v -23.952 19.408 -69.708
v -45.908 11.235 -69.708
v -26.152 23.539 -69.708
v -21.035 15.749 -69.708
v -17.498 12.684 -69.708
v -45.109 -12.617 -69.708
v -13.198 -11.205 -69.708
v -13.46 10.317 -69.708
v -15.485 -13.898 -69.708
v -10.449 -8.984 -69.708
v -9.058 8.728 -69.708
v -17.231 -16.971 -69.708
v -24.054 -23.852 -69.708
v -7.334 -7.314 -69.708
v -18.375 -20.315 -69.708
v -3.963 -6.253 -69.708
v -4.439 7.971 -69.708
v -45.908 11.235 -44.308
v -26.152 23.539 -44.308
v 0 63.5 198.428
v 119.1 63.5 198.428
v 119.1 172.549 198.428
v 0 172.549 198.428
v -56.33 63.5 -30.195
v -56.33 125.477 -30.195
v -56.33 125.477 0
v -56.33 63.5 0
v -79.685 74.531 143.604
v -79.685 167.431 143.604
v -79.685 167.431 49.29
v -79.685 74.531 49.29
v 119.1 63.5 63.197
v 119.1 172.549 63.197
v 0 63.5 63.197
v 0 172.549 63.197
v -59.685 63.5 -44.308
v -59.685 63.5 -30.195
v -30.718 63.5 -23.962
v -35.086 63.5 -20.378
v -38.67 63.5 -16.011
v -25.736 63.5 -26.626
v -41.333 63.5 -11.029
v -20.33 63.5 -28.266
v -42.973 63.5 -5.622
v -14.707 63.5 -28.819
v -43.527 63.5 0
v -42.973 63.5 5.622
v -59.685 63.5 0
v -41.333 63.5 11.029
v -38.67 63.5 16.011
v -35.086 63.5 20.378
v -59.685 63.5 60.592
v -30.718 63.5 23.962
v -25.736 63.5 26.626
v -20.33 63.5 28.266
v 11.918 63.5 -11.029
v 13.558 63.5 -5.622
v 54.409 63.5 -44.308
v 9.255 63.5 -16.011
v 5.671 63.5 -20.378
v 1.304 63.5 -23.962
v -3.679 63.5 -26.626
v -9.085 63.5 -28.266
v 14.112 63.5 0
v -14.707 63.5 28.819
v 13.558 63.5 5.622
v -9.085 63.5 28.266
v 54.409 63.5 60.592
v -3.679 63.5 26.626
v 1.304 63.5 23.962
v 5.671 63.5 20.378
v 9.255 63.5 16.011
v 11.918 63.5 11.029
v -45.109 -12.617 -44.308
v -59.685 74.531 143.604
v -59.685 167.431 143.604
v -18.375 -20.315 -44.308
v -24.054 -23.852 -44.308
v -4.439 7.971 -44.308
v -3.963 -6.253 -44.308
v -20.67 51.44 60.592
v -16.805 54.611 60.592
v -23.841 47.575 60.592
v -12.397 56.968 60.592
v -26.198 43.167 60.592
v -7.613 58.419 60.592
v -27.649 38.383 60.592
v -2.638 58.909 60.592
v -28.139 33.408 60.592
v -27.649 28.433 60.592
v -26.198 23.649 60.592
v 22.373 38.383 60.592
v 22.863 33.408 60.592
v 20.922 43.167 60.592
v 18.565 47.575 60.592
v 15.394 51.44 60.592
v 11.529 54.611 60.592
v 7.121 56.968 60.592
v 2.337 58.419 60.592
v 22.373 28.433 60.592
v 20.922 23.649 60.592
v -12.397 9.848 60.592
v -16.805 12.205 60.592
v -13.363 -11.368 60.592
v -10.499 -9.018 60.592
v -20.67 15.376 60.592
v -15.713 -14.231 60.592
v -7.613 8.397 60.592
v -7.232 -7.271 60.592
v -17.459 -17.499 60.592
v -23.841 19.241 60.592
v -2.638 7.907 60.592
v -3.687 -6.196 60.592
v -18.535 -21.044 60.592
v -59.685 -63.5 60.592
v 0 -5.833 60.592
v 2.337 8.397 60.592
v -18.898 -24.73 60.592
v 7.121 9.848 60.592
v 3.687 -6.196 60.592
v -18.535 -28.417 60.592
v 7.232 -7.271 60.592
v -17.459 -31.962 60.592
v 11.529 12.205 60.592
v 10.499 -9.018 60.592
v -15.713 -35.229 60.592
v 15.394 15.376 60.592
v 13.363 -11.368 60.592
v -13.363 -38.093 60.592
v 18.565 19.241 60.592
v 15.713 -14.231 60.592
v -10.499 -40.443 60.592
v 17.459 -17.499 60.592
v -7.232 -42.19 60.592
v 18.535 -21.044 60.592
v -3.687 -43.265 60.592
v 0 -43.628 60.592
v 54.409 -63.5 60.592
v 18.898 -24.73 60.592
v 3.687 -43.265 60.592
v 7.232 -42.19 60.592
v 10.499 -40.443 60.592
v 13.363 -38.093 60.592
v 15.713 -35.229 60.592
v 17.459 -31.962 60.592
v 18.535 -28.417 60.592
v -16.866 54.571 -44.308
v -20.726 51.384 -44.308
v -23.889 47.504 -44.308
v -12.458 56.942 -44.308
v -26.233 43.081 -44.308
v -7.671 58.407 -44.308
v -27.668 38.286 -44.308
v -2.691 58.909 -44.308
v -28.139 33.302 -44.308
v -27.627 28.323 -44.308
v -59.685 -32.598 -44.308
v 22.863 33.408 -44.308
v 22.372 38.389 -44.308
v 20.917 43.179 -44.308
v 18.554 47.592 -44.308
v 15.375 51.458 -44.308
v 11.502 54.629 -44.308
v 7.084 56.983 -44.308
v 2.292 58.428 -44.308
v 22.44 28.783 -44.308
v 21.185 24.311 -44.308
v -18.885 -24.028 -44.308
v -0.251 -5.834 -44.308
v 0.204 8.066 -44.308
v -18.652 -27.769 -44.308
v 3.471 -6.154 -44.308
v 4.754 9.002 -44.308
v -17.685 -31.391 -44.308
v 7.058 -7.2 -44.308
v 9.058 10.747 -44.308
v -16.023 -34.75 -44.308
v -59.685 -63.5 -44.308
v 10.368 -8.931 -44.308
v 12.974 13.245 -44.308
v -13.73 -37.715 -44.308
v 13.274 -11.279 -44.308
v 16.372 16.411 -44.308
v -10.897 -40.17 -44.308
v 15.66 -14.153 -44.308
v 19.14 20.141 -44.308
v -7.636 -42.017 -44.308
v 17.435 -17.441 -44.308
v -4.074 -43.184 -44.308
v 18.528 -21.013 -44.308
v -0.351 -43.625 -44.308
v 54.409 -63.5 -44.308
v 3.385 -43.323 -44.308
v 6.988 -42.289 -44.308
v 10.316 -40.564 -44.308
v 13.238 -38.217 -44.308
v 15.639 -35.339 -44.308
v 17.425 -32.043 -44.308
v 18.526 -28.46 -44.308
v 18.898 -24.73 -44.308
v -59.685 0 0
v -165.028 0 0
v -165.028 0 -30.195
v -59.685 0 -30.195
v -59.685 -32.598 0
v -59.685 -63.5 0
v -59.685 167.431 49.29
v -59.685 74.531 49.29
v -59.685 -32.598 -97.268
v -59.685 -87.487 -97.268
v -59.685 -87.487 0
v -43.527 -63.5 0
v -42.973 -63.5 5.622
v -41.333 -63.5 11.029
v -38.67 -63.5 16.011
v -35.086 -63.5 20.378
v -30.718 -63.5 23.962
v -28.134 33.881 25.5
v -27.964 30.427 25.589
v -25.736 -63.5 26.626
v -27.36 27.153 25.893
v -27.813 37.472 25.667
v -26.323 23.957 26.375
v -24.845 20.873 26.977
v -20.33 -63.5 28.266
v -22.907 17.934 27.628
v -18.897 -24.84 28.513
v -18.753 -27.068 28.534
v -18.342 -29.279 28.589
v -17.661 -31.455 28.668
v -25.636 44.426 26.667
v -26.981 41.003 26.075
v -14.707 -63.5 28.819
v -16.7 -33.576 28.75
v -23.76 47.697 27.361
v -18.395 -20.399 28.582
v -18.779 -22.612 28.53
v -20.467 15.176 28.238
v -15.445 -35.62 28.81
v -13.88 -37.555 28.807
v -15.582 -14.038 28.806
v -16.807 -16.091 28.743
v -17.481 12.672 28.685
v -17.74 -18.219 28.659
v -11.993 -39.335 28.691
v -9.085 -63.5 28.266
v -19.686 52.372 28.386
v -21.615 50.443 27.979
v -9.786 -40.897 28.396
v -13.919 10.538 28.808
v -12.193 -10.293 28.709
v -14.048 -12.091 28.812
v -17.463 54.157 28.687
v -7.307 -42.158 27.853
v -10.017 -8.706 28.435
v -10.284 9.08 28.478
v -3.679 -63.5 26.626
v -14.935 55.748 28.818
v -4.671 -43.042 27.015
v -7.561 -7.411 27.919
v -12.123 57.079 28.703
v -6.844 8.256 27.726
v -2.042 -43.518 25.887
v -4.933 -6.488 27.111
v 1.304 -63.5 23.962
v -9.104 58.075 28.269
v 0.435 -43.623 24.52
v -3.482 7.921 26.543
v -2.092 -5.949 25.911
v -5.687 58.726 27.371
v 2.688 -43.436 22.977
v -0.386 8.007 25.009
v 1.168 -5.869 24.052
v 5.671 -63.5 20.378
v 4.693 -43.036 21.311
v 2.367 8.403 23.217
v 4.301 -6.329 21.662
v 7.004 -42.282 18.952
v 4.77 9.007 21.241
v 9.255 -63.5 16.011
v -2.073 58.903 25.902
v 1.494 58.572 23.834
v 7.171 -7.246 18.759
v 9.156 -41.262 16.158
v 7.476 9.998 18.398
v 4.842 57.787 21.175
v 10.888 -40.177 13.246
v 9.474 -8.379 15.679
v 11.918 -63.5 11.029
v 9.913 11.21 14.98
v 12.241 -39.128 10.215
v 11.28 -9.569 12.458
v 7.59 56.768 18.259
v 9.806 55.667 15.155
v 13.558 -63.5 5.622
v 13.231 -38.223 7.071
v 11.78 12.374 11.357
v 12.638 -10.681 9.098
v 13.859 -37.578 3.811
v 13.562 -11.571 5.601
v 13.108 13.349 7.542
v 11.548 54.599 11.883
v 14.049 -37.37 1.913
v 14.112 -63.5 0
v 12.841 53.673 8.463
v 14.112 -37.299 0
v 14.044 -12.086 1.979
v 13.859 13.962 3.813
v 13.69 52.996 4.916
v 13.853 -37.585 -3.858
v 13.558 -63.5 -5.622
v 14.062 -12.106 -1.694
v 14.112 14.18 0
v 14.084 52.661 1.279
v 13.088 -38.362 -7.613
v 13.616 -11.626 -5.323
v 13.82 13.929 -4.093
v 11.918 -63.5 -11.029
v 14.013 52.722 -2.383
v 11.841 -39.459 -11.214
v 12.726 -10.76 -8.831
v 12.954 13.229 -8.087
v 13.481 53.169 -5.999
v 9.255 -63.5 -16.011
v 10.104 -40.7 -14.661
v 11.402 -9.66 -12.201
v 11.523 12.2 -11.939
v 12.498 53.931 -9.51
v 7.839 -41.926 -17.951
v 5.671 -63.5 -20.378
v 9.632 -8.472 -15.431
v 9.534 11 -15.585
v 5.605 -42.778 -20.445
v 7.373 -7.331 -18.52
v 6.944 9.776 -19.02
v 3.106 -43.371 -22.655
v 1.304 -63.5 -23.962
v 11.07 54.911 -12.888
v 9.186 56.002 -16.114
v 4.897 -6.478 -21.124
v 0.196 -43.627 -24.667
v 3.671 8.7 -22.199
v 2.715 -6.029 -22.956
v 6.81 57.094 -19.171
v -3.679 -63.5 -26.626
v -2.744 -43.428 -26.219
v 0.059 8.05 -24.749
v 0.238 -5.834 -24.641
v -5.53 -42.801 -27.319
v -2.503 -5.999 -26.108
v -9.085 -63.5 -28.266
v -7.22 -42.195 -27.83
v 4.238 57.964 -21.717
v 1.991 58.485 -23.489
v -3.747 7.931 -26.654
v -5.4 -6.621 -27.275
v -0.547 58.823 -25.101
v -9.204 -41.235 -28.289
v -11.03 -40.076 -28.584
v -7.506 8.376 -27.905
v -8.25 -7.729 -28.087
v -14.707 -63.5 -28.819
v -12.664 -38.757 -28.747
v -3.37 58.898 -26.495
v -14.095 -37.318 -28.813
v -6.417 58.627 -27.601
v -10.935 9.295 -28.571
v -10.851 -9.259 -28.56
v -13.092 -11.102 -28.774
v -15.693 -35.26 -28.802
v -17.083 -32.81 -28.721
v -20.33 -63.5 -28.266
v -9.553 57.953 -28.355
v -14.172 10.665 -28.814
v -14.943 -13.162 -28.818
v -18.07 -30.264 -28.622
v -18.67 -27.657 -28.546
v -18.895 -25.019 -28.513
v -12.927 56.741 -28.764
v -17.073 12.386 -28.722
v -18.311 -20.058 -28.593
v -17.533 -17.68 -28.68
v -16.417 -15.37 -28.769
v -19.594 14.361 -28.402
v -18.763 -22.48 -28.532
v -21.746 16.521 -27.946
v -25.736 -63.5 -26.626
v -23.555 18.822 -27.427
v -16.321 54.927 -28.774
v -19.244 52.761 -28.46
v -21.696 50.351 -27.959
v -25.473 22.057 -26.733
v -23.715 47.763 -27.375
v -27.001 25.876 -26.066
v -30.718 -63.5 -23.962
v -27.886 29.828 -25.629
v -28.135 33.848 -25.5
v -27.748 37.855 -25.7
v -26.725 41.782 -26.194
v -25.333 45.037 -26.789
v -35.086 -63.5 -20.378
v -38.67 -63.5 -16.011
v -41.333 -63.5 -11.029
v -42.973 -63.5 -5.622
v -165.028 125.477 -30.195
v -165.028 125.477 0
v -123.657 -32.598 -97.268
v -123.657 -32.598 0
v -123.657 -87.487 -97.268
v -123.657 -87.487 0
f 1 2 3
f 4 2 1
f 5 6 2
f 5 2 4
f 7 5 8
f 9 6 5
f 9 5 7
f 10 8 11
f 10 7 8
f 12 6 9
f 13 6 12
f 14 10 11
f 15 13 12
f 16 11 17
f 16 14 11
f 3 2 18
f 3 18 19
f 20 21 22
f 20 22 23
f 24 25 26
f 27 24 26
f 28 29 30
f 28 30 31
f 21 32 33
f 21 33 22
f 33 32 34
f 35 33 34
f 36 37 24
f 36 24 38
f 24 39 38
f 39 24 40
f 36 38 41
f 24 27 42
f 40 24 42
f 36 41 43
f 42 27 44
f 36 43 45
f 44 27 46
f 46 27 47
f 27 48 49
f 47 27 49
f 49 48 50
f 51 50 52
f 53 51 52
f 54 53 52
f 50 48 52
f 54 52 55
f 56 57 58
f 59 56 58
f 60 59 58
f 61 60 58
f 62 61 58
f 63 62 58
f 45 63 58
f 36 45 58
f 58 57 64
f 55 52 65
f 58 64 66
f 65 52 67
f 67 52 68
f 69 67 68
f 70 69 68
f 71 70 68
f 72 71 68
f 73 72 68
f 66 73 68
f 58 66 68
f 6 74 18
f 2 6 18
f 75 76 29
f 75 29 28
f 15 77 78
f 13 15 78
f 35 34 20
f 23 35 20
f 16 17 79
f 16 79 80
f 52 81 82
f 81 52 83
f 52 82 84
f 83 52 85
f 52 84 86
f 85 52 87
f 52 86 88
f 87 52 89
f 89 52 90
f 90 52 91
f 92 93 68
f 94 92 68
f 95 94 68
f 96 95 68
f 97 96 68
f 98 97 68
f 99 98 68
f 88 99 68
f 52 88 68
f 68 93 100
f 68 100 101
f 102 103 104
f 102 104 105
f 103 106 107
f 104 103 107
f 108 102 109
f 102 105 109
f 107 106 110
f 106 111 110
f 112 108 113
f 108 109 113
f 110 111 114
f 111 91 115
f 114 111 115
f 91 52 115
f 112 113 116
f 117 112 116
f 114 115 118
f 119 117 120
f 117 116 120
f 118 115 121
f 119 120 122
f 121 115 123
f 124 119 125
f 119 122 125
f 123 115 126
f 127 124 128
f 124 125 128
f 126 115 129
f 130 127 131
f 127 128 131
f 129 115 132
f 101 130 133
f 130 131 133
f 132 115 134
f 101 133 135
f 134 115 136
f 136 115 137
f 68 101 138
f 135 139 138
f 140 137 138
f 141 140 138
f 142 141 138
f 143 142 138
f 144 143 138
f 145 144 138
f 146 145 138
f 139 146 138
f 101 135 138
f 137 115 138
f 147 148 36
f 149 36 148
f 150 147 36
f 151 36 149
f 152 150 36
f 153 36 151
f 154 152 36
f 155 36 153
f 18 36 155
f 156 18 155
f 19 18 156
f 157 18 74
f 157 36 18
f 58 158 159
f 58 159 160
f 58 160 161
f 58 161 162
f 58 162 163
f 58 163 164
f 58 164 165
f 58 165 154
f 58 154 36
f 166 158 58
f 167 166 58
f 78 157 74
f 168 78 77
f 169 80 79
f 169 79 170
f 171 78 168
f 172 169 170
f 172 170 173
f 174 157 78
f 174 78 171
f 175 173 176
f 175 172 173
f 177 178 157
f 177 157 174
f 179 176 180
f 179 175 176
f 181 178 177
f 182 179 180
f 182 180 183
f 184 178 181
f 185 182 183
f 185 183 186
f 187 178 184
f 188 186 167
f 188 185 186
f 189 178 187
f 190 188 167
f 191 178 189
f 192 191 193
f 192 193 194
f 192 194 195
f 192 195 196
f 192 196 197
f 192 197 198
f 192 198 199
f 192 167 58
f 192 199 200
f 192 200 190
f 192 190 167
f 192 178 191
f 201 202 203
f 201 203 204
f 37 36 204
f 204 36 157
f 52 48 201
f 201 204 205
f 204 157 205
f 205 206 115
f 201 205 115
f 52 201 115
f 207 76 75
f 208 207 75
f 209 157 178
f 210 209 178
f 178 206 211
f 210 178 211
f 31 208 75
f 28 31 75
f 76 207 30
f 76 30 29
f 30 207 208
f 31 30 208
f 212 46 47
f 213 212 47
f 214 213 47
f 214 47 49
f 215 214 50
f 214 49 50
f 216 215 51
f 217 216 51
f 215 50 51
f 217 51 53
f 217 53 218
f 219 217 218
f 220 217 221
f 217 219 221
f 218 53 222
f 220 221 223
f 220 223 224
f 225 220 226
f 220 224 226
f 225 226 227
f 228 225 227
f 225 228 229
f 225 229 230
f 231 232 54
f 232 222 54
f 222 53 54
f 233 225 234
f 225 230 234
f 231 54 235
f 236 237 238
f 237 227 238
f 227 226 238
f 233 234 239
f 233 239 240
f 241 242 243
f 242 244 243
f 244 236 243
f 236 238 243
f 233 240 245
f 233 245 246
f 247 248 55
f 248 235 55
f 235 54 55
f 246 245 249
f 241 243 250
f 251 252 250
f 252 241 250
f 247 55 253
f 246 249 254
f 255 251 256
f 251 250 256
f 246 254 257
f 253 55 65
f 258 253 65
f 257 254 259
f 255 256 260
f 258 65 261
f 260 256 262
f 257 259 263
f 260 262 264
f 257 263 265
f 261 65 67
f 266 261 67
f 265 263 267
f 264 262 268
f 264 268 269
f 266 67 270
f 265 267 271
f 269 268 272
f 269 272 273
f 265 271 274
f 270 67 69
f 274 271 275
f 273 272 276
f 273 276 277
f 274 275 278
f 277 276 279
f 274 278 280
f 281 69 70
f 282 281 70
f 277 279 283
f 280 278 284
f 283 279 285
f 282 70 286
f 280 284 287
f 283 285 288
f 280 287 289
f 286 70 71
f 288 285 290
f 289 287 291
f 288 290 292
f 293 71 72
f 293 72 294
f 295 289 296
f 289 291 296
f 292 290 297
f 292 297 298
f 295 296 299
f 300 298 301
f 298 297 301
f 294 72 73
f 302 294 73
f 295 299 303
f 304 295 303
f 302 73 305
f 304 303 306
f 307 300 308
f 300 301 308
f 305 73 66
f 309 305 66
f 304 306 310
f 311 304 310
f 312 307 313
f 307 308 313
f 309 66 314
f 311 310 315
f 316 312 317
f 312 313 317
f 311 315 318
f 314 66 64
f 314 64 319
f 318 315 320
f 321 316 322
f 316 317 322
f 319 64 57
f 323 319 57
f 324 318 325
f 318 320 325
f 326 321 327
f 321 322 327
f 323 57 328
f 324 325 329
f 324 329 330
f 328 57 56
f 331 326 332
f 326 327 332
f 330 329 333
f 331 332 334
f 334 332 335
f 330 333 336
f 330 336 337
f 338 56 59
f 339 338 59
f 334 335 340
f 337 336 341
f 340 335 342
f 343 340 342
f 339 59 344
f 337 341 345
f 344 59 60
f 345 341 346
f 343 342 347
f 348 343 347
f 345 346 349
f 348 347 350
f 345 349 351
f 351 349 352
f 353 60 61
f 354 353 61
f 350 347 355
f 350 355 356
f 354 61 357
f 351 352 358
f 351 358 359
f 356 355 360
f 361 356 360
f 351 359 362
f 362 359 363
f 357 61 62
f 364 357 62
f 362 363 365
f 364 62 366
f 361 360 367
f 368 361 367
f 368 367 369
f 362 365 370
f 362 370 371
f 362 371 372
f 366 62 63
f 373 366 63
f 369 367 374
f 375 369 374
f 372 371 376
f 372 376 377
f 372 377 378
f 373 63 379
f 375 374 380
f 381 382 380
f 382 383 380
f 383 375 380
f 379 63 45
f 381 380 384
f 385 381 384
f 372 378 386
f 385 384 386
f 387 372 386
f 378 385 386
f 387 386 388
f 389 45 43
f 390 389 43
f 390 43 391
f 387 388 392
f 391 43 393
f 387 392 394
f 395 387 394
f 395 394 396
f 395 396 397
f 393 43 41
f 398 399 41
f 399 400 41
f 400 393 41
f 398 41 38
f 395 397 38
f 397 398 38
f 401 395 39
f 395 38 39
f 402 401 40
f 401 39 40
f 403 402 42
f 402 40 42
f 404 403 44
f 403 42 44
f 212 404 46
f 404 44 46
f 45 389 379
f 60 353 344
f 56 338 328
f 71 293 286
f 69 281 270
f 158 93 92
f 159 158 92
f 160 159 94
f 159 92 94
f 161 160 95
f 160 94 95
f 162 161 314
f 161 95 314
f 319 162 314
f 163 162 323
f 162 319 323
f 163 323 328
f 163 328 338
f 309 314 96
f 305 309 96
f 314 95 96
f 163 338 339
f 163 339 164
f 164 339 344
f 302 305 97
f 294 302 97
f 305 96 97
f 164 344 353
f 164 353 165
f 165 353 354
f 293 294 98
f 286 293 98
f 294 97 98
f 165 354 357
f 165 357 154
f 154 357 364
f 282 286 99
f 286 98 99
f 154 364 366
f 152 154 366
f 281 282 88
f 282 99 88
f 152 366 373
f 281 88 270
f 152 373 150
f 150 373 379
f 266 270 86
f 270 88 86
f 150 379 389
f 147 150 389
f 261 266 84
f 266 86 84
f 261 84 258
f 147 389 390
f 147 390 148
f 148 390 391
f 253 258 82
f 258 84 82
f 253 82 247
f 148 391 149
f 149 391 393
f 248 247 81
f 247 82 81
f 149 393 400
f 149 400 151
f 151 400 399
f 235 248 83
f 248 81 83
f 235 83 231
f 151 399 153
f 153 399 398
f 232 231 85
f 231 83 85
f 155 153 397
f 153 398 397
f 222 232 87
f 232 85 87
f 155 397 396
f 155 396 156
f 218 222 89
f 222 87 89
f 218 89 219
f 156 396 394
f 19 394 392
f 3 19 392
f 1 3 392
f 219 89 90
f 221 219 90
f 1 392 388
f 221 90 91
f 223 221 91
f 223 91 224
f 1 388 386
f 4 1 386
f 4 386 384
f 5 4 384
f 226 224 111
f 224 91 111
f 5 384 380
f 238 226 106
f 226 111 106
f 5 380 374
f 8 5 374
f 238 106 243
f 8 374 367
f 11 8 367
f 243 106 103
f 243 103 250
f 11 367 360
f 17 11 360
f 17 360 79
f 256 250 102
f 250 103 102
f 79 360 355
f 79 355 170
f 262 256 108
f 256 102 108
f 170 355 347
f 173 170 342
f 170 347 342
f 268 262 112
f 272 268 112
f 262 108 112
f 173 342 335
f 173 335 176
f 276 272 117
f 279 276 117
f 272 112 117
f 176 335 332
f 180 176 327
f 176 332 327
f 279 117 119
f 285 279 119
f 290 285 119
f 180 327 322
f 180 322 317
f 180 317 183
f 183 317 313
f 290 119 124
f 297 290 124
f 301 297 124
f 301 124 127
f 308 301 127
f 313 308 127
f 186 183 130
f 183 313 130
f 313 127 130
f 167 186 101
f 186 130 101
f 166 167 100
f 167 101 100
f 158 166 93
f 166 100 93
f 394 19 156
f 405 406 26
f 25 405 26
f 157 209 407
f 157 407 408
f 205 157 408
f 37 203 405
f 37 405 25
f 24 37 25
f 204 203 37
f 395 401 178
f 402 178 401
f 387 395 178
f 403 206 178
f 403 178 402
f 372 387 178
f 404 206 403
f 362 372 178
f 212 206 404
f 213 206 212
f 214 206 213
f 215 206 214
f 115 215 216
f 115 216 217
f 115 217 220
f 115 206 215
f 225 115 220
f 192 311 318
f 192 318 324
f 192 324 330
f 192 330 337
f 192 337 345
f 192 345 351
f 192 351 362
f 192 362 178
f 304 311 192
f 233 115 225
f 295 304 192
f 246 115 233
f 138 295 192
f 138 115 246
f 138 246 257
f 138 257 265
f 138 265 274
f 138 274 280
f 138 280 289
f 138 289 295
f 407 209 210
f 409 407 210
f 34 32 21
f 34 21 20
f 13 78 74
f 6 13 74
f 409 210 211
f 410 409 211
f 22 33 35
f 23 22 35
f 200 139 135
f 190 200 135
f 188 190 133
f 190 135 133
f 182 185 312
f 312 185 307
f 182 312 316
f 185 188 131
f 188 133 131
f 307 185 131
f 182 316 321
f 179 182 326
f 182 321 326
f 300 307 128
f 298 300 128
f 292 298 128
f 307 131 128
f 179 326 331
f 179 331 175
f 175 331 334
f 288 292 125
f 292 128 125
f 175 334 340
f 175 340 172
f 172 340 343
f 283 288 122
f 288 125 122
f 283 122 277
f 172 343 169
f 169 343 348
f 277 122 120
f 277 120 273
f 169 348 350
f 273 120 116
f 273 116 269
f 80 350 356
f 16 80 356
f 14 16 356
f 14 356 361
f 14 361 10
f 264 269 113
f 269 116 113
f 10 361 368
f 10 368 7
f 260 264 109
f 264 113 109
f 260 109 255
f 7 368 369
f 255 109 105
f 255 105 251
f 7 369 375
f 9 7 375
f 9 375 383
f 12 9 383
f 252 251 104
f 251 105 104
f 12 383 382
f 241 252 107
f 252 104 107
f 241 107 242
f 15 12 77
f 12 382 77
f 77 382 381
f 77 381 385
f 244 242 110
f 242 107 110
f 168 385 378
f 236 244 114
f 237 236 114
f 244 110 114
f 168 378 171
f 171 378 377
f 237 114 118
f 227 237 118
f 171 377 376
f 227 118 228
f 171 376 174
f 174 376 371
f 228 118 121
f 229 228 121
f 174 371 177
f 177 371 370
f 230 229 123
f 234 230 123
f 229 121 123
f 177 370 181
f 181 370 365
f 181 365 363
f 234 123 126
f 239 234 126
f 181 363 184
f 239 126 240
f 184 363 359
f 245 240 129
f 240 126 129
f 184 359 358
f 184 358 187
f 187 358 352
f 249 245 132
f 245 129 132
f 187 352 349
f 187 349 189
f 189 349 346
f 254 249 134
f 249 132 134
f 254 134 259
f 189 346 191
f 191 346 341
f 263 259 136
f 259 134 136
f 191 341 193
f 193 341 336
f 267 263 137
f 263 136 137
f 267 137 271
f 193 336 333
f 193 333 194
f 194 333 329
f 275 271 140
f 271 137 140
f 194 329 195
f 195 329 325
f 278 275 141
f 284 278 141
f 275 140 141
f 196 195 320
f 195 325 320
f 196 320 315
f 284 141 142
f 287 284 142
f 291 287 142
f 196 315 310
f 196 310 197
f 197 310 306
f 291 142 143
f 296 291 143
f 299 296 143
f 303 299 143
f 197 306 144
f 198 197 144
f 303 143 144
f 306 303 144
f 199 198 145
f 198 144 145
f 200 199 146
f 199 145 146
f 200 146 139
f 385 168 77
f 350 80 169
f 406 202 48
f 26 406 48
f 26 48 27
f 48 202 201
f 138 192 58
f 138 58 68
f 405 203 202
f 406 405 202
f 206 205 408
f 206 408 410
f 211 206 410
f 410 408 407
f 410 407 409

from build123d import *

# Parameters (mm, degrees)
F0_W      = 114.093814
F0_H      = 104.899831
F1_DEPTH  = 63.5
F3_R      = 28.819288
F4_DEPTH  = 181.759881
F7_DEPTH  = 25.4
F8_W      = 108.697593
F8_H      = 30.195445
F9_DEPTH  = 125.476776
F10_W     = 92.900261
F10_H     = 94.313533
F11_DEPTH = 20
F12_R     = 18.897695
F12_R_2   = 25.500808
F13_DEPTH = 174.705634
F14_W     = 54.888762
F14_H     = 97.26797
F15_DEPTH = 63.972233
F16_W     = 119.099848
F16_H     = 135.23142
F17_DEPTH = 109.049382


with BuildPart() as f1:
    # F0 (on Front) → F1 (new body, symmetric)
    with BuildSketch(Plane.XZ):
        with Locations((-2.63801, 8.141744)):
            Rectangle(F0_W, F0_H)
    extrude(amount=F1_DEPTH, both=True)

    # F3 (on face) → F4 (cut)
    with BuildSketch(Plane(origin=(0, 63.5, 0), x_dir=(-1, 0, 0), z_dir=(0, 1, 0))):
        with Locations((14.707234, 0)):
            Circle(F3_R)
    extrude(amount=-F4_DEPTH, mode=Mode.SUBTRACT)

    # F6 (on face) → F7 (join)
    with BuildSketch(Plane(origin=(0, 0, -44.308171), x_dir=(1, 0, 0), z_dir=(0, 0, -1))):
        Polygon((-3.796602, 11.234766), (-24.053921, 23.851941), (-45.109375, 12.617175), (-45.90751, -11.234766), (-25.650191, -23.851941), (-4.594737, -12.617175), align=None)
    extrude(amount=F7_DEPTH)

    # F8 (on face) → F9 (join)
    with BuildSketch(Plane.XZ):
        with Locations((-110.679119, -15.097722)):
            Rectangle(F8_W, F8_H)
    extrude(amount=-F9_DEPTH)

    # F12 (on face) → F13 (cut)
    with BuildSketch(Plane.XY.offset(60.59166)):
        with Locations((0, -24.730466)):
            Circle(F12_R)
        with Locations((-2.63801, 33.408009)):
            Circle(F12_R_2)
    extrude(amount=-F13_DEPTH, mode=Mode.SUBTRACT)

    # F14 (on face) → F15 (join)
    with BuildSketch(Plane(origin=(-59.684917, 0, 0), x_dir=(0, -1, 0), z_dir=(-1, 0, 0))):
        with Locations((60.04278, -48.633985)):
            Rectangle(F14_W, F14_H)
    extrude(amount=F15_DEPTH)


with BuildPart() as f11:
    # F10 (on face) → F11 (new body)
    with BuildSketch(Plane(origin=(-59.684917, 0, 0), x_dir=(0, -1, 0), z_dir=(-1, 0, 0))):
        with Locations((-120.980821, 96.447215)):
            Rectangle(F10_W, F10_H)
    extrude(amount=F11_DEPTH)


with BuildPart() as f17:
    # F16 (on face) → F17 (new body)
    with BuildSketch(Plane(origin=(0, 63.5, 0), x_dir=(-1, 0, 0), z_dir=(0, 1, 0))):
        with Locations((-59.549924, 130.812593)):
            Rectangle(F16_W, F16_H)
    extrude(amount=F17_DEPTH)


solid = Compound([f1.part, f11.part, f17.part])
